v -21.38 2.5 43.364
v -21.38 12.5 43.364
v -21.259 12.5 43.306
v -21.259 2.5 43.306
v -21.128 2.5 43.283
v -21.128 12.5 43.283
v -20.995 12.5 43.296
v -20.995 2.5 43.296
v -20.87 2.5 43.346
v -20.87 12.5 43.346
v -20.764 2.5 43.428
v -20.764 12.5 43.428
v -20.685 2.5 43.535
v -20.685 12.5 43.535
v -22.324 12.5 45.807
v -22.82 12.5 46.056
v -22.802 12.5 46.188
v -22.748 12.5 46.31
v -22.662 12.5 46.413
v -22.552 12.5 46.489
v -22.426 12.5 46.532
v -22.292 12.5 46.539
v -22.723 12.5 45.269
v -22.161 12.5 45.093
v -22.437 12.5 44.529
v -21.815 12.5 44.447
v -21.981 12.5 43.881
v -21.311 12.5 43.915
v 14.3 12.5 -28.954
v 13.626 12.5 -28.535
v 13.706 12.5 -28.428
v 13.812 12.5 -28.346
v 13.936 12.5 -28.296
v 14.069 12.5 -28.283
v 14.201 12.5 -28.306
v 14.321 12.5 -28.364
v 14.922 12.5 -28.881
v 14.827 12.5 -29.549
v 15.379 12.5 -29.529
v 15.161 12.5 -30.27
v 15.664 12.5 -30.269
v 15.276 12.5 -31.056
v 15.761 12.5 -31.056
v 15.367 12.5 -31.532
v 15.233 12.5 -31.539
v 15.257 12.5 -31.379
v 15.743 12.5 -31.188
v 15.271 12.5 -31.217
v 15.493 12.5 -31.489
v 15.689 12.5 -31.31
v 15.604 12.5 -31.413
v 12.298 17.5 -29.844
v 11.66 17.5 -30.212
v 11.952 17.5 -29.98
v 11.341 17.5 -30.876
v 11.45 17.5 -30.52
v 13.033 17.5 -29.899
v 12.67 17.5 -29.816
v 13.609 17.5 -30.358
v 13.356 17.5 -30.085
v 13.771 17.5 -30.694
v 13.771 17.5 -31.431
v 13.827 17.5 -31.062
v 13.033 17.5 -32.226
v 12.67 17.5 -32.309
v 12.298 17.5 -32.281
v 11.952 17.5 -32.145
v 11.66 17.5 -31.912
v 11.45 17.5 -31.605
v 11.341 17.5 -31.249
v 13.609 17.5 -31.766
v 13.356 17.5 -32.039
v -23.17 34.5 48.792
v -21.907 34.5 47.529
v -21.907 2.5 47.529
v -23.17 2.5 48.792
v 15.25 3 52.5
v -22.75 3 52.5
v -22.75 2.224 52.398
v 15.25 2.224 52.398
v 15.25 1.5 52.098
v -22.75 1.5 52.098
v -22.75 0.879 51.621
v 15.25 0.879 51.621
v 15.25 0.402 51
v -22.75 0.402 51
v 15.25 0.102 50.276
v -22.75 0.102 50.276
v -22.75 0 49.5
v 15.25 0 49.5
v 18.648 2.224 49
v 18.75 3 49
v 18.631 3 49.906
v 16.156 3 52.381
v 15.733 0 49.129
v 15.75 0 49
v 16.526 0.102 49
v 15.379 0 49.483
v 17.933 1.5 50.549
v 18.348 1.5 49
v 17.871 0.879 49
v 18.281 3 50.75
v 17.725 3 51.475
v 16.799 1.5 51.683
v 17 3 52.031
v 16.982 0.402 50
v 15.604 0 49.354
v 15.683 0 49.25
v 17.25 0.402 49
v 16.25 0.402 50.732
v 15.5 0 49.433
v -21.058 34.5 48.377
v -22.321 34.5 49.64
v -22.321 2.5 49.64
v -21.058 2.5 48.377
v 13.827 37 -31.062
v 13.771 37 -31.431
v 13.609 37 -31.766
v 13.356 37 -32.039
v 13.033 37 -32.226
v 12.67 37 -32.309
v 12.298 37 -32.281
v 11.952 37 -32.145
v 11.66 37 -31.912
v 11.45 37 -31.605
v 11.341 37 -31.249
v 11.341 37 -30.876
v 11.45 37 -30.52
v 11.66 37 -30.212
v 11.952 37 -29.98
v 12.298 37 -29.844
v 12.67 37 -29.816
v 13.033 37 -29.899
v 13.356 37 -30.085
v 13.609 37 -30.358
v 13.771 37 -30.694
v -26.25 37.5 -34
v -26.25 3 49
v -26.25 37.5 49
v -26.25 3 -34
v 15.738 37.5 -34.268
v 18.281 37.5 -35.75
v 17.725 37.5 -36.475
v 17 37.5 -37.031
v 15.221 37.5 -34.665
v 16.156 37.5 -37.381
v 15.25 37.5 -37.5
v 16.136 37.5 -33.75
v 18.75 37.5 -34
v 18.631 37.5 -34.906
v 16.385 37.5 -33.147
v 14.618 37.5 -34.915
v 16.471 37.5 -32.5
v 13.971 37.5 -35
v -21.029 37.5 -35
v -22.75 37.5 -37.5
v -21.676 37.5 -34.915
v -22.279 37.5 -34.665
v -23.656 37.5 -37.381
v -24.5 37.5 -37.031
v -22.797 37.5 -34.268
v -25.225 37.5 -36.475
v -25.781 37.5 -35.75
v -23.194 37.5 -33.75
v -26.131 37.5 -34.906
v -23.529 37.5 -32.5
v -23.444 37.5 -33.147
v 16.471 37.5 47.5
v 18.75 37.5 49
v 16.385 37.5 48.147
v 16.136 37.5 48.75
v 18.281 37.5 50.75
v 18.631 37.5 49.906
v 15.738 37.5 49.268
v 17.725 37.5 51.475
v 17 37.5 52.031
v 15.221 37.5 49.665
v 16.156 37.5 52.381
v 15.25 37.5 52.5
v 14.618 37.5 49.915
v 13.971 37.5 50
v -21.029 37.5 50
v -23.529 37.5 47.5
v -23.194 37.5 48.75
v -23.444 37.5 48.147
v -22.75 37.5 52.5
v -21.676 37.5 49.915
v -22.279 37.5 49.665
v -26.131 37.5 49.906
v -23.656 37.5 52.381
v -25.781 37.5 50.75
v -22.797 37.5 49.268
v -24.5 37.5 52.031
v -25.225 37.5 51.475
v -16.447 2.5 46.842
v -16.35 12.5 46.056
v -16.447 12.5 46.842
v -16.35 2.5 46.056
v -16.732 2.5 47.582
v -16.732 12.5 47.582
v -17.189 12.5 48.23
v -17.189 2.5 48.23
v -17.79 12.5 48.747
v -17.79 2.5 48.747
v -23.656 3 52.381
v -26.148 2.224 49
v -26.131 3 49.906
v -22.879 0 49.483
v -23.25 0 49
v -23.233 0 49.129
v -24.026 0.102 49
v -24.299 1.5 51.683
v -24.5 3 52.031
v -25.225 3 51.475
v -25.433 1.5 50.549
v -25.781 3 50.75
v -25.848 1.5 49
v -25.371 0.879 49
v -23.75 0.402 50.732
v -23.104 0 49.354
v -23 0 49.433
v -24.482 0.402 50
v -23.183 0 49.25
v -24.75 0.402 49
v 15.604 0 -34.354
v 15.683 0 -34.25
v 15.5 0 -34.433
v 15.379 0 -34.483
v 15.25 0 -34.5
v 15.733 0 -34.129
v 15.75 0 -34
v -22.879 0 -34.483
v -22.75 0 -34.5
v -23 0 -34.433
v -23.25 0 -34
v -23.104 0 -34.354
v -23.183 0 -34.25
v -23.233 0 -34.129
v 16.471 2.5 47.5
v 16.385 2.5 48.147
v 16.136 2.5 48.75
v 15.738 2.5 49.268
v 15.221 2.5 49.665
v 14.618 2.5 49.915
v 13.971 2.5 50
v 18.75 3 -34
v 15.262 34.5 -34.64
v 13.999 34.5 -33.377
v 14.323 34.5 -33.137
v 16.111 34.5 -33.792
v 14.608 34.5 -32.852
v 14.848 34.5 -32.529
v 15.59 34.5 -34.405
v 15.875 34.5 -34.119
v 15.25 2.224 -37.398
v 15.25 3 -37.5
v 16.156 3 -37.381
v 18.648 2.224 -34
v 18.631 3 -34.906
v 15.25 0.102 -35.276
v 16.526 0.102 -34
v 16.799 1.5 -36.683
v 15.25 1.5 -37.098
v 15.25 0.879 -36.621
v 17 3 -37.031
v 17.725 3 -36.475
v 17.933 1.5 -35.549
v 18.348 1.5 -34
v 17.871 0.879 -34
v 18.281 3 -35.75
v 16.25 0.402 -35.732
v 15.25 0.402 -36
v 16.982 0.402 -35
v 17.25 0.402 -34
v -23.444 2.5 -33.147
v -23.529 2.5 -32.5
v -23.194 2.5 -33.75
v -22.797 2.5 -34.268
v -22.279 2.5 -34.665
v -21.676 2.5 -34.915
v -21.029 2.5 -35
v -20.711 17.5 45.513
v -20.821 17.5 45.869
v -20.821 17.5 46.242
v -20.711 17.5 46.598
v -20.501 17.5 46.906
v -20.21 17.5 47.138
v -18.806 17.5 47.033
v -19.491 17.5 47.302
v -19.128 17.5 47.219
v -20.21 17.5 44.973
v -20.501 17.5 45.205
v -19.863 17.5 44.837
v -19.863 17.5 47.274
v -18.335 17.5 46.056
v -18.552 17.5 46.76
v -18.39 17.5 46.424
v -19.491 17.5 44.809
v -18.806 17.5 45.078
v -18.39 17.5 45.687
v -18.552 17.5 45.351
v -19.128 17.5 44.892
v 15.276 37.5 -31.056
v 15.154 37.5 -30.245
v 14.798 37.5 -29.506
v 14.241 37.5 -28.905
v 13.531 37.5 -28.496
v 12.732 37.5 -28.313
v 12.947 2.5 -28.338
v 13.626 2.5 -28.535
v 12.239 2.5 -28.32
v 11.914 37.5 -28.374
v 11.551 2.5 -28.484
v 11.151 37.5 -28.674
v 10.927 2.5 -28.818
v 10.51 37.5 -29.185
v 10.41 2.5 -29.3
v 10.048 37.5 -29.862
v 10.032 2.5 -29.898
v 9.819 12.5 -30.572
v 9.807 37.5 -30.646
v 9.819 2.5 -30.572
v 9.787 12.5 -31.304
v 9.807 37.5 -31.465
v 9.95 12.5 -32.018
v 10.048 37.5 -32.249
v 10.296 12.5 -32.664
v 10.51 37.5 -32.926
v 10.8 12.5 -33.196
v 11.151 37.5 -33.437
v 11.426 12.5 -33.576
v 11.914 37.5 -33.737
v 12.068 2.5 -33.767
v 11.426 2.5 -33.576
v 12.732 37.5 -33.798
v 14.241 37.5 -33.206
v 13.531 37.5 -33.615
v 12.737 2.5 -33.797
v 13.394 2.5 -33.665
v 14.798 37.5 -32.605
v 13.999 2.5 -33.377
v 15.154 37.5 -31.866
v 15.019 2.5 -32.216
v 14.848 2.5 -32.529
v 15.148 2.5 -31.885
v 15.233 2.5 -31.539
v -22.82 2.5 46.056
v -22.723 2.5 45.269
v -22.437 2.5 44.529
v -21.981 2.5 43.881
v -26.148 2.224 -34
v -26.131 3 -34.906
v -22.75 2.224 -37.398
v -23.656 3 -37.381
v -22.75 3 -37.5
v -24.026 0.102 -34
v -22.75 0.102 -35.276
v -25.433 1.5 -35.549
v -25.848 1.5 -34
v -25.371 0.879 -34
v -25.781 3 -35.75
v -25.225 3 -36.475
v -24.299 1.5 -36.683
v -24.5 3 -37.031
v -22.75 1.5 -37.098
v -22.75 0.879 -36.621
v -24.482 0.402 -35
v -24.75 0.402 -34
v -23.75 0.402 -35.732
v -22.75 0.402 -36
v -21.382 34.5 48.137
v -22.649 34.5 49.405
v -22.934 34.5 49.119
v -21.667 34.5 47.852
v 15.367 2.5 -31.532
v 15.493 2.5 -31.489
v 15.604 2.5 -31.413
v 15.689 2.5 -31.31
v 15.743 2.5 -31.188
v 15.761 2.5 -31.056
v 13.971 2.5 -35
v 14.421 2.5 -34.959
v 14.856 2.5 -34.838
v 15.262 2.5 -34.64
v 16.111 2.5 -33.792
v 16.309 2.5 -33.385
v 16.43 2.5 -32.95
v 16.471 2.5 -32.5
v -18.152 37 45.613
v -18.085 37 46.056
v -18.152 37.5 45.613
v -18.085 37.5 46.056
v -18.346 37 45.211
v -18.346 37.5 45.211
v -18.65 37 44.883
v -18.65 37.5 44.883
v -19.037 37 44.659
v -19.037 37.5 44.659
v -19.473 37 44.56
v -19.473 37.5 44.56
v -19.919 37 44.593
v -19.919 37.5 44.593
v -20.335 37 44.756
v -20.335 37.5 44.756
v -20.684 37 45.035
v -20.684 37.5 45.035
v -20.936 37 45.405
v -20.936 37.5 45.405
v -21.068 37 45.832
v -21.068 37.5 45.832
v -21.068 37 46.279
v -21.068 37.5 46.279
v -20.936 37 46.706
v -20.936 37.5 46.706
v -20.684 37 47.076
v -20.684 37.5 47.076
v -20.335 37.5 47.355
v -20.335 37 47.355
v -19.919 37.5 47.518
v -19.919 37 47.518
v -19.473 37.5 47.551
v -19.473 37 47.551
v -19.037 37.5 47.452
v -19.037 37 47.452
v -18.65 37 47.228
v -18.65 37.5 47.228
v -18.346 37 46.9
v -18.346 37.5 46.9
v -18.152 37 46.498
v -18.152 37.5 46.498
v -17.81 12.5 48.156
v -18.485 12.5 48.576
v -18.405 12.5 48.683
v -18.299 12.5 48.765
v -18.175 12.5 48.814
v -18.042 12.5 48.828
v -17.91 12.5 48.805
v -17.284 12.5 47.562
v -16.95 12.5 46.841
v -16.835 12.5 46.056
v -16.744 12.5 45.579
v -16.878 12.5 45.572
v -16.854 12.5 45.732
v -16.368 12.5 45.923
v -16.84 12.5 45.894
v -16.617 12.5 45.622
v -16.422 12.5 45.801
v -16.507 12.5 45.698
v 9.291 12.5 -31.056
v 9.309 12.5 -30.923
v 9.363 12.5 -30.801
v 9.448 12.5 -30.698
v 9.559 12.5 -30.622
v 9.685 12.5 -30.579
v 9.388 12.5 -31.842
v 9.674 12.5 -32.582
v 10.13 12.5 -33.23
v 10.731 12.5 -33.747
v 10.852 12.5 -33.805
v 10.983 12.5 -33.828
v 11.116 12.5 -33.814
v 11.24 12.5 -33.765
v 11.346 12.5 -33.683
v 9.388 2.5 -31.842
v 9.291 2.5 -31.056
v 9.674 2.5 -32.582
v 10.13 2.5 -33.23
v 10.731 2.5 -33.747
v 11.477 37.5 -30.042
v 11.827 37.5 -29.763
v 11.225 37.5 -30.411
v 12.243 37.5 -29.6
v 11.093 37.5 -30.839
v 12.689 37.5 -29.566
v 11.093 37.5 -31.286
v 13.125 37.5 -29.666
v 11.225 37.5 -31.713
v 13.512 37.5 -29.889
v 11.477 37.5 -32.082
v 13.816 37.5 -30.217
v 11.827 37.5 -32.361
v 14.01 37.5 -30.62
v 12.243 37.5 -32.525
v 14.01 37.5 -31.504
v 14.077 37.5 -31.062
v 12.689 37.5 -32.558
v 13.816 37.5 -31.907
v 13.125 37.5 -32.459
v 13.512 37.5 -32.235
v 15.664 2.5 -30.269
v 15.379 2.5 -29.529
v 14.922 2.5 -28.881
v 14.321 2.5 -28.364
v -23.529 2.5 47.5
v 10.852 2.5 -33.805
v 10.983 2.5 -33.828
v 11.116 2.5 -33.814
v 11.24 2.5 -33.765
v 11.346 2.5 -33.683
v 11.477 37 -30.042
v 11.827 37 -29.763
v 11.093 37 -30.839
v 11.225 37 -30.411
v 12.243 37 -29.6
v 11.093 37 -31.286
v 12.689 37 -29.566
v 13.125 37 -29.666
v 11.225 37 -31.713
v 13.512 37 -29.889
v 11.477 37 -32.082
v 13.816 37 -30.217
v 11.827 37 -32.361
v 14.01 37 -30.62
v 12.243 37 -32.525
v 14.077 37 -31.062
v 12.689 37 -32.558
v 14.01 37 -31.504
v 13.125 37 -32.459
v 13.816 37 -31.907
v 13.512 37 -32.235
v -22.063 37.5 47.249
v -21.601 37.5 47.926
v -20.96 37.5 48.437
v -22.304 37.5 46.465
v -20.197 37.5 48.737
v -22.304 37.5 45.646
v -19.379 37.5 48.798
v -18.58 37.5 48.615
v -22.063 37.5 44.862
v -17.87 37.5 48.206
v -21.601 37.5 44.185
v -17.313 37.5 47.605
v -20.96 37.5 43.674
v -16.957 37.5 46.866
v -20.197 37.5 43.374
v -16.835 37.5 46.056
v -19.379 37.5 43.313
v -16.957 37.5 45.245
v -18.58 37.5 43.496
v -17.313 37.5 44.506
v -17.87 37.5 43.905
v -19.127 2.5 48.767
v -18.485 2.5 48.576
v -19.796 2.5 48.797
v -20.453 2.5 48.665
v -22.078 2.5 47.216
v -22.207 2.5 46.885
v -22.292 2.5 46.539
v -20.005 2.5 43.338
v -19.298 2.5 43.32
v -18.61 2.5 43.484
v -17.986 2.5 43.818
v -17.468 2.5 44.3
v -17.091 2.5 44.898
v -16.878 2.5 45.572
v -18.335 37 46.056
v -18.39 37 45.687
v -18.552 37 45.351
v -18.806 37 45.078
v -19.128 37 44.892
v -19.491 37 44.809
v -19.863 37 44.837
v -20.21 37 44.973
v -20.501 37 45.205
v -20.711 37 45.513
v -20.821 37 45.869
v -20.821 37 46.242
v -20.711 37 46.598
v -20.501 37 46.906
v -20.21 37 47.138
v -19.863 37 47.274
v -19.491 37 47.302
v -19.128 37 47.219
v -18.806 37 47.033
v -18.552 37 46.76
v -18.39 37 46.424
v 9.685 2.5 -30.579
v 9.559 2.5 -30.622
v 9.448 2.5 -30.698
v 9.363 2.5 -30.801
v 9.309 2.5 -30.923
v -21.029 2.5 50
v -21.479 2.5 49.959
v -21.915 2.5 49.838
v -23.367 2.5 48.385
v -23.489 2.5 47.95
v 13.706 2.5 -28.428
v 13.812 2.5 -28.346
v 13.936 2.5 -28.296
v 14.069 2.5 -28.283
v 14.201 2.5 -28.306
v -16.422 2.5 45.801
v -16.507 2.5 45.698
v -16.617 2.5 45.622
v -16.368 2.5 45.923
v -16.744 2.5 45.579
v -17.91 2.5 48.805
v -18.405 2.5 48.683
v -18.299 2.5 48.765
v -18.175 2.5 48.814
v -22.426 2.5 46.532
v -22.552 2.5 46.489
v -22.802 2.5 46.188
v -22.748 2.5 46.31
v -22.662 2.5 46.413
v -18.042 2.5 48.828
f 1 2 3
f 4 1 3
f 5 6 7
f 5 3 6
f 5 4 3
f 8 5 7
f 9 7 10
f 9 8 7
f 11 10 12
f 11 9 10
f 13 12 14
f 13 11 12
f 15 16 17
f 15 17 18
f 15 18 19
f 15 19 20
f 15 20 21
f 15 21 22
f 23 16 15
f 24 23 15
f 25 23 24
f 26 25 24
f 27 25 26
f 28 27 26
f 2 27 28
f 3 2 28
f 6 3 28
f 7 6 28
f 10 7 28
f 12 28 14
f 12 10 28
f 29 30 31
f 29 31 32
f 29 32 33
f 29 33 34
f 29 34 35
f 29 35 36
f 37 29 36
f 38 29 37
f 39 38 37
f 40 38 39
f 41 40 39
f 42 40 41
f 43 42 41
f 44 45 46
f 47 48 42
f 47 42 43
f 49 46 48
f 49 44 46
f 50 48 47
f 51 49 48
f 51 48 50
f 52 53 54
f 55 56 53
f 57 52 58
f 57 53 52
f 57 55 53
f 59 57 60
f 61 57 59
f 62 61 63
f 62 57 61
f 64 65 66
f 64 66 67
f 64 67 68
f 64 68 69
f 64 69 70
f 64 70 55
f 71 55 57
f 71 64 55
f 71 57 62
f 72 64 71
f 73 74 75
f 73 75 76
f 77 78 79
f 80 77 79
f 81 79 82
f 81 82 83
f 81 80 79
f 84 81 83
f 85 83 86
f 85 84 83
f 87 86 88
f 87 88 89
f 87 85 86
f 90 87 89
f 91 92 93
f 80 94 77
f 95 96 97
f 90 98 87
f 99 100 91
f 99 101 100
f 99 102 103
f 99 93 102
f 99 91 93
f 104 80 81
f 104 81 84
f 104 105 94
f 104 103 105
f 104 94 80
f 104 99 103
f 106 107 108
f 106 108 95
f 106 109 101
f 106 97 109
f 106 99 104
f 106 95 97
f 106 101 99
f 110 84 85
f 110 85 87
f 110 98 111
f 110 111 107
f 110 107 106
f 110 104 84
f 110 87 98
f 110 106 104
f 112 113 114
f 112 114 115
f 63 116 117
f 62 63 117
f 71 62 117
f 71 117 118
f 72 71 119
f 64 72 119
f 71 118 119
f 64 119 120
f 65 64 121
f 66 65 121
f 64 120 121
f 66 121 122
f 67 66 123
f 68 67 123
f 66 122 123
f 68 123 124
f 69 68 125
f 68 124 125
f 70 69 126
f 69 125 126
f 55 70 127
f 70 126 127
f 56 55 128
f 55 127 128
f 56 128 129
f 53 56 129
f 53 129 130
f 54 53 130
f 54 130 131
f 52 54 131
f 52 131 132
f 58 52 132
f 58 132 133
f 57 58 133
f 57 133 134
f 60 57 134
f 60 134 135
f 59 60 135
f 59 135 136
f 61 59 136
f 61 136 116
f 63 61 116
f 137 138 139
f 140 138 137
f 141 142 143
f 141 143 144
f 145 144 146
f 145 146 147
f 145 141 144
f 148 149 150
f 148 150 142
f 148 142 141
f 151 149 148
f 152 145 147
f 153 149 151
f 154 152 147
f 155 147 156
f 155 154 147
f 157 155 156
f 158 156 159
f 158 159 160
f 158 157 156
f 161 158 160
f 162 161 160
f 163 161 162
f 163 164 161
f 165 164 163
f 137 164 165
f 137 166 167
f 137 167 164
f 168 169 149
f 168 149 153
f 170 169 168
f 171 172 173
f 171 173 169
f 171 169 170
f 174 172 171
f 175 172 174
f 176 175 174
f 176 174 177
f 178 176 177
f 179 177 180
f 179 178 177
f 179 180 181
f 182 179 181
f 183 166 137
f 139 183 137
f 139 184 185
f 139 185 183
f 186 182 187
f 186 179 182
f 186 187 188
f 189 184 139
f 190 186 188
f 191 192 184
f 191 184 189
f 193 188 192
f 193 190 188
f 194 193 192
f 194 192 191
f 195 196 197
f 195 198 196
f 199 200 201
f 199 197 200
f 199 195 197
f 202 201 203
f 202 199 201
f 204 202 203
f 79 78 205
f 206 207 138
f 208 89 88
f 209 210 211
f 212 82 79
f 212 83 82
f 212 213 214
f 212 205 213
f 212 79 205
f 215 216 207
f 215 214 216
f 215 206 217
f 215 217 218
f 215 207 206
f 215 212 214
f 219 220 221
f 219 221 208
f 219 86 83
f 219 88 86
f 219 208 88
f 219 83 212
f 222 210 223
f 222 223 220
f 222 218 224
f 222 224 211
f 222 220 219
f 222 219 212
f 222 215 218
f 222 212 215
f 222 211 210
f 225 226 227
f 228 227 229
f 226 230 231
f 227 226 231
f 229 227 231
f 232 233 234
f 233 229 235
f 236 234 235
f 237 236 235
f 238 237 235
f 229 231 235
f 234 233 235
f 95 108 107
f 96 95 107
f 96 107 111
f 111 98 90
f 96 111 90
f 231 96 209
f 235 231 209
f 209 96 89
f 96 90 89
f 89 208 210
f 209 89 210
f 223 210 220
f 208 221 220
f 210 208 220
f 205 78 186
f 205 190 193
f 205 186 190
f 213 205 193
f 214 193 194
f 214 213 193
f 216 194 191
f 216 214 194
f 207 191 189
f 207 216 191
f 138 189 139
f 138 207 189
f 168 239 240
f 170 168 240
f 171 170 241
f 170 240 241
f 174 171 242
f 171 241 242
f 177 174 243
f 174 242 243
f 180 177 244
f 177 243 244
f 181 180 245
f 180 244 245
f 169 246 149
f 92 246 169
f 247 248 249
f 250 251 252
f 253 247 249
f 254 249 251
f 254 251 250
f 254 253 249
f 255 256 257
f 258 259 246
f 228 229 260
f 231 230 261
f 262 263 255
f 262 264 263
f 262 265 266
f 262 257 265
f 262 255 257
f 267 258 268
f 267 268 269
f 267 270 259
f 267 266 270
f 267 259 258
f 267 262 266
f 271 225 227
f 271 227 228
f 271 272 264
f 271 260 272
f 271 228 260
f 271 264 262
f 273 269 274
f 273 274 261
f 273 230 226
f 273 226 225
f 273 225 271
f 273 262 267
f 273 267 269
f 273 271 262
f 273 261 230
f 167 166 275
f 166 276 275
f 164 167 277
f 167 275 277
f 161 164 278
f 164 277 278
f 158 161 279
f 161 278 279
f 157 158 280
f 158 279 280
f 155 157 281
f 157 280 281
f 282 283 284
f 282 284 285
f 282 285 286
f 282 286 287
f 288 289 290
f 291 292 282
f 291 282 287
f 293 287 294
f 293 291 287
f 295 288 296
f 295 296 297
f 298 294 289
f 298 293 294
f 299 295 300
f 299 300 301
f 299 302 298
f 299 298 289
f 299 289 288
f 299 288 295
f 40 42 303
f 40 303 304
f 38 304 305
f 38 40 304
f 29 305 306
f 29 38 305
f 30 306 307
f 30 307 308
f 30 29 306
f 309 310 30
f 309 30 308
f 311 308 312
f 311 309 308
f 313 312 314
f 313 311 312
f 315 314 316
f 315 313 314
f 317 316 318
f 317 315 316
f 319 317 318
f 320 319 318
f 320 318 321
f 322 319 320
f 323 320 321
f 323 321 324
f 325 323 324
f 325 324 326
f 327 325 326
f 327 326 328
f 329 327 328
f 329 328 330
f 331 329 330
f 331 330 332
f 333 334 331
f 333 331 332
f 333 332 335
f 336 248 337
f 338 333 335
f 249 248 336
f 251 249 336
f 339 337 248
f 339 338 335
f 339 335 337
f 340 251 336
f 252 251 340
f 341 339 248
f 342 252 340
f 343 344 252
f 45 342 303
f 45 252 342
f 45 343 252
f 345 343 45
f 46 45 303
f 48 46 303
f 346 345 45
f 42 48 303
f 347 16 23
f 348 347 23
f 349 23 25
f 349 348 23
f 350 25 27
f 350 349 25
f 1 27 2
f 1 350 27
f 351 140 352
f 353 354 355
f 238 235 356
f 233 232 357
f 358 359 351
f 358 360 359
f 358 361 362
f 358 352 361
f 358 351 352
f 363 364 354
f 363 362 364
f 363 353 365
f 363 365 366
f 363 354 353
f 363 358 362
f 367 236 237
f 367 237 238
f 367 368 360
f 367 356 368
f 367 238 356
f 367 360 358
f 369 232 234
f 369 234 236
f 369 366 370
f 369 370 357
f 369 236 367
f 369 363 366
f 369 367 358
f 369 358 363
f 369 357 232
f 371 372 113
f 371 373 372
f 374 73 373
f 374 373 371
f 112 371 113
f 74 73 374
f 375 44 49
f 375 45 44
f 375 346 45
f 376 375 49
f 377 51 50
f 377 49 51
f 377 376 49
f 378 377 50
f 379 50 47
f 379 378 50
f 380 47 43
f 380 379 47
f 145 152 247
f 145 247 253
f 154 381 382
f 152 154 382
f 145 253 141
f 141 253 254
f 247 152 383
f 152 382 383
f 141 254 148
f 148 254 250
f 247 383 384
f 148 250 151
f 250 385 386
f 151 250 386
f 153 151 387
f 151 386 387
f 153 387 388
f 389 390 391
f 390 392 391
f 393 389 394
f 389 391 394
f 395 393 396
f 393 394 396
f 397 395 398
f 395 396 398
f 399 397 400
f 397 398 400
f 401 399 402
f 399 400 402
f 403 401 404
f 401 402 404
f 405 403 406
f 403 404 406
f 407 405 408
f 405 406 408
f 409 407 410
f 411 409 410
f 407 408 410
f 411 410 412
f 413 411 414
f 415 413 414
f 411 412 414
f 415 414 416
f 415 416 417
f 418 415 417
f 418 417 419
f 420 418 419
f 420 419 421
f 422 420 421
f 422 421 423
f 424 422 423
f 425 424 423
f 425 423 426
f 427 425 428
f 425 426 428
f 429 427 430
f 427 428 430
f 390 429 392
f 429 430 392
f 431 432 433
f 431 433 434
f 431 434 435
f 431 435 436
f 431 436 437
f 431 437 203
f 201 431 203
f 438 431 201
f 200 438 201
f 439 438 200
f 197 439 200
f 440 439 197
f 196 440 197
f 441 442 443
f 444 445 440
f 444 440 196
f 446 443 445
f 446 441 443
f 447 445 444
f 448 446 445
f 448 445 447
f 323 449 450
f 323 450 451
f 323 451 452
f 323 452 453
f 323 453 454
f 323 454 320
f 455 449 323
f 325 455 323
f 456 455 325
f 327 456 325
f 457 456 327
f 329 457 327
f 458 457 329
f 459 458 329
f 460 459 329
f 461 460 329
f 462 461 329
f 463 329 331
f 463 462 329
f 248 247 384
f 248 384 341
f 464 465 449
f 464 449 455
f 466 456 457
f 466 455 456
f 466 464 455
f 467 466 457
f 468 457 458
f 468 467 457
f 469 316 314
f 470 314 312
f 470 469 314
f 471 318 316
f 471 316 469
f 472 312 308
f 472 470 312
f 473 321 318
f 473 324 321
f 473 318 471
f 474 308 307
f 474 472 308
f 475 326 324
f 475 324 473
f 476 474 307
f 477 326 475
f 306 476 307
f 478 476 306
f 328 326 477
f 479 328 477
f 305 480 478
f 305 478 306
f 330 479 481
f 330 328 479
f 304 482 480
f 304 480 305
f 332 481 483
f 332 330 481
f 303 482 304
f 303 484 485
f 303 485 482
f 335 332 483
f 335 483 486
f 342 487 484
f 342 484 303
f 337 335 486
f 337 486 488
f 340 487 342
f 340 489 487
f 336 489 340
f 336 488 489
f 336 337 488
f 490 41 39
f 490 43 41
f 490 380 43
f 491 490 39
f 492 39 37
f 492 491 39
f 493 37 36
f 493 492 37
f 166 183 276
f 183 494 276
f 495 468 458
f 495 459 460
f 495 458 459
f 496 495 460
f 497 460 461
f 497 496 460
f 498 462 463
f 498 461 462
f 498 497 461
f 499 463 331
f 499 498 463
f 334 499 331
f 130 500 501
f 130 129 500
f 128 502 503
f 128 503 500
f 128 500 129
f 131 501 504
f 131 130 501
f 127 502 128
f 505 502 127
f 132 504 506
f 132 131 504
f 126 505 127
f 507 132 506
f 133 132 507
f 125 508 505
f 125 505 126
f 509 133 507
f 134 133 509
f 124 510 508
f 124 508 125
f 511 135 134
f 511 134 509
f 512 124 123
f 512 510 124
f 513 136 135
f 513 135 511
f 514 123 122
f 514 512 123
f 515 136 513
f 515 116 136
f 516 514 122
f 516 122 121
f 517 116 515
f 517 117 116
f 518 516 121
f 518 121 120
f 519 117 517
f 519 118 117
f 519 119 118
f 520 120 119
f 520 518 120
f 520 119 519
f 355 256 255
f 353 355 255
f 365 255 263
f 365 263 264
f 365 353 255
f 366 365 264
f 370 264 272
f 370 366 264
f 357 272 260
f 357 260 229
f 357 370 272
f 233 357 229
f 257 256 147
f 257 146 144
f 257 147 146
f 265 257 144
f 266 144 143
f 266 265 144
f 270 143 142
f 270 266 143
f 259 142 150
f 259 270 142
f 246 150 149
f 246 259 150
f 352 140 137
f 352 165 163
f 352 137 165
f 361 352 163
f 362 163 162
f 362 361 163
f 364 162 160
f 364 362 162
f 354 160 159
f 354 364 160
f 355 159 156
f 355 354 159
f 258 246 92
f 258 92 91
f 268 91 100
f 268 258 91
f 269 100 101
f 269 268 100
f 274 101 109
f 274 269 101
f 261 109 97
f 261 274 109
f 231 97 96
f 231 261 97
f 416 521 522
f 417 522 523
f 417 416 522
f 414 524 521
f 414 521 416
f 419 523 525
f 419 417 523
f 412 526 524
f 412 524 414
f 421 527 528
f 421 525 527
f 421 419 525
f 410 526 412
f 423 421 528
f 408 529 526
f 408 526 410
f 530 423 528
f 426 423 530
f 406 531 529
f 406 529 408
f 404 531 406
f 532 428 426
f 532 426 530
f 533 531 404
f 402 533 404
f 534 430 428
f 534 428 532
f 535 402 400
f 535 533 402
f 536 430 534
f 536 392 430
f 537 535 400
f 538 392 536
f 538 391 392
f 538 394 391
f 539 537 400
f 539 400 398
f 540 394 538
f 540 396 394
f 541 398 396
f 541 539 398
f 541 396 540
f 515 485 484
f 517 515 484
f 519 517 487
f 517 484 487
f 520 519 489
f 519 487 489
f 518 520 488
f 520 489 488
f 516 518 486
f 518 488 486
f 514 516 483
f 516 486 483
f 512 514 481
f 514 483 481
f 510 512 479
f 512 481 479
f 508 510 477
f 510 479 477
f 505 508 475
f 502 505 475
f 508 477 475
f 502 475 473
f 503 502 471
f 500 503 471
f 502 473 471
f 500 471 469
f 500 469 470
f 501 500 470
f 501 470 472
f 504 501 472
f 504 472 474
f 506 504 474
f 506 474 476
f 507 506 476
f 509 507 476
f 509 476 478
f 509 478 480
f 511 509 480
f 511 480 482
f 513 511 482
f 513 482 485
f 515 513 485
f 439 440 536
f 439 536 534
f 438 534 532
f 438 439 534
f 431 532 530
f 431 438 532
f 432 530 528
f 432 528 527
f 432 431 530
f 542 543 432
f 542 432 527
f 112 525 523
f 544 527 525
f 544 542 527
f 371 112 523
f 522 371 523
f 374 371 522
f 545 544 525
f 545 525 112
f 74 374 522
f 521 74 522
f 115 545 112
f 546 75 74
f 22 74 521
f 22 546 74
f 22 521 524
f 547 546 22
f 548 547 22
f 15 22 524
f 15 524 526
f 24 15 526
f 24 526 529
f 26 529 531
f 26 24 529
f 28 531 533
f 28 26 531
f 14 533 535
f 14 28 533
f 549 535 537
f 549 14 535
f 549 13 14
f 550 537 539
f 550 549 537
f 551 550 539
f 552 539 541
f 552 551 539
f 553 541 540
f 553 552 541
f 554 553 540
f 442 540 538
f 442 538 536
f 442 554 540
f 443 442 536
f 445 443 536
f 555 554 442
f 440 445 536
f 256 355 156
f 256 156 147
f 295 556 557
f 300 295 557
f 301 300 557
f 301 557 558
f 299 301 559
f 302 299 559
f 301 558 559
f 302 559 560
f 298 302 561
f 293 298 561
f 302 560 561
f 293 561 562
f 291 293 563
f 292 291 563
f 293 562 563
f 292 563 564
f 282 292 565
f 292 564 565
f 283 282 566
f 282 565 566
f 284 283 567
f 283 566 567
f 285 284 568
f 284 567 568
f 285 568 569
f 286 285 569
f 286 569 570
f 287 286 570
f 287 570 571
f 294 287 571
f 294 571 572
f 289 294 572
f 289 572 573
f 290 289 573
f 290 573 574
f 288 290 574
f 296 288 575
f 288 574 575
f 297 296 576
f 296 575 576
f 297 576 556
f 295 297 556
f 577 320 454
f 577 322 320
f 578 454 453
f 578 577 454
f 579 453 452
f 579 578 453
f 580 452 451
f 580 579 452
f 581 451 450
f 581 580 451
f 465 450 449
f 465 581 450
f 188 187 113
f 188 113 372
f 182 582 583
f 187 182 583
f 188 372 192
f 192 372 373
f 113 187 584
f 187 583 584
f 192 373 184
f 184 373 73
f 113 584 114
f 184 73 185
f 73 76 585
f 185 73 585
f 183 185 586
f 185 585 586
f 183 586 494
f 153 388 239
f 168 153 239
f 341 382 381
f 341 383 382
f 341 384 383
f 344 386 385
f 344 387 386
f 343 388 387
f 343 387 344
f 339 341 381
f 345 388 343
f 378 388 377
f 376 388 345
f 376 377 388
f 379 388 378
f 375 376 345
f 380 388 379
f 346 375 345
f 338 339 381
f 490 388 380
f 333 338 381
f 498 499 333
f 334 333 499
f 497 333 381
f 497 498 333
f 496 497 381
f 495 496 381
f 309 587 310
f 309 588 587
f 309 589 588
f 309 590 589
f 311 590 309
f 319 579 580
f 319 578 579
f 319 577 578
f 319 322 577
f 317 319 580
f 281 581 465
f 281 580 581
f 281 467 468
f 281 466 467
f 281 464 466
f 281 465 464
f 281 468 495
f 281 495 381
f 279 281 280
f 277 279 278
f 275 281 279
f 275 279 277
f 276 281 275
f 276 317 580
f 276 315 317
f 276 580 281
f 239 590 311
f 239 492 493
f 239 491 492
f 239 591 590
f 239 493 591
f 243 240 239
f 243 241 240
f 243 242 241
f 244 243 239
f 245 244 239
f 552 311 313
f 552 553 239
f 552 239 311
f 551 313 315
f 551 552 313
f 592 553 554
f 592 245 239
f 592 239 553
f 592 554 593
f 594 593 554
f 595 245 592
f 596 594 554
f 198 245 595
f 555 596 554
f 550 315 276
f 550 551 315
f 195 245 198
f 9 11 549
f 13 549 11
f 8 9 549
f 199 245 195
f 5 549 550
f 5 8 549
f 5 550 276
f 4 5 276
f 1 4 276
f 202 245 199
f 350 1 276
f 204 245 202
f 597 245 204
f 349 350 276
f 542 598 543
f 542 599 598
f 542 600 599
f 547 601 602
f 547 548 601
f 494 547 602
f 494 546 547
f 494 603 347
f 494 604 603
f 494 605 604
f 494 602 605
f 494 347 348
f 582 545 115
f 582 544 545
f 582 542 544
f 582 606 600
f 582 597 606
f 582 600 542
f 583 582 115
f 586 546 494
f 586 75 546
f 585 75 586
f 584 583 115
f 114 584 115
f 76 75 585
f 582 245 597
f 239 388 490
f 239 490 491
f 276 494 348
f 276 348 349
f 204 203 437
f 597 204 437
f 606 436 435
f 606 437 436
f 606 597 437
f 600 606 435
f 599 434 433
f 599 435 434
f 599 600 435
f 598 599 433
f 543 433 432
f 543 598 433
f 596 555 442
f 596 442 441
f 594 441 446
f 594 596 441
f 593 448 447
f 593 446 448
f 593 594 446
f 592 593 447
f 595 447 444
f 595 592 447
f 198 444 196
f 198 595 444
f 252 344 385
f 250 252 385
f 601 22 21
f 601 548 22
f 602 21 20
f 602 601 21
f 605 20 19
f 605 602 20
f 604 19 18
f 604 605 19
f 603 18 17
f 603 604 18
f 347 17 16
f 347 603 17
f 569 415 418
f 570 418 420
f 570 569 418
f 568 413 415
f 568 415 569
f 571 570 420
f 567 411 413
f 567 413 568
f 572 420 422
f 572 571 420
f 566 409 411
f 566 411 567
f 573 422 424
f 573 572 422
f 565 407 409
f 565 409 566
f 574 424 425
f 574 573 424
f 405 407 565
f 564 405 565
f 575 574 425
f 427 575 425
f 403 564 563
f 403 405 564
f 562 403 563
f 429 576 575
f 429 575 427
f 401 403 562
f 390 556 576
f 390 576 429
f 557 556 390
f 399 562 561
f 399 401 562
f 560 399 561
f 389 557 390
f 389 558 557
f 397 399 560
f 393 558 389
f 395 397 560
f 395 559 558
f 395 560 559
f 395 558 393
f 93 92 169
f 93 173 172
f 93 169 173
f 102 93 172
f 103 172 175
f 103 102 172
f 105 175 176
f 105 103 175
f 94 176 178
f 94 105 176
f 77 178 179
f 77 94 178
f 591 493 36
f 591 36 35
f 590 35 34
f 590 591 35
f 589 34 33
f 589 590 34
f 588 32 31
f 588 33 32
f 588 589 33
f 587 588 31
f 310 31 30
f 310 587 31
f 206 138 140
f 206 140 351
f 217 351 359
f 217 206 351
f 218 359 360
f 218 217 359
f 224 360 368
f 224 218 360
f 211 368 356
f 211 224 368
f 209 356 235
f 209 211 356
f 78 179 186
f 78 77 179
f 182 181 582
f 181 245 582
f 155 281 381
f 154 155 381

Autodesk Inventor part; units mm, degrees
ref_plane "YZ Plane" through (0, 0, 0) normal (1, 0, 0) x (0, 1, 0)
ref_plane "XZ Plane" through (0, 0, 0) normal (0, 1, 0) x (-1, 0, 0)
ref_plane "XY Plane" through (0, 0, 0) normal (0, 0, 1) x (1, 0, 0)
sketch "Sketch1" plane through (0, 0, 0) normal (0, 1, 0) x (-1, 0, 0)
  line L0 (-18.75, 52.5) -> (26.25, 52.5)
  line L1 (26.25, 52.5) -> (26.25, -37.5)
  line L2 (26.25, -37.5) -> (-18.75, -37.5)
  line L3 (-18.75, -37.5) -> (-18.75, 52.5)
  line L4 (26.25, 52.5) -> (-18.75, -37.5) construction
  line L5 (-16.4706, 50) -> (23.5294, 50)
  line L6 (23.5294, 50) -> (23.5294, -35)
  line L7 (23.5294, -35) -> (-16.4706, -35)
  line L8 (-16.4706, -35) -> (-16.4706, 50)
  line L9 (23.5294, 50) -> (-16.4706, -35) construction
  line L10 (23.5294, 50) -> (21.0294, 50)
  line L11 (21.0294, 50) -> (21.0294, 47.5)
  line L12 (21.0294, 47.5) -> (23.5294, 47.5)
  line L13 (23.5294, 47.5) -> (23.5294, 50)
  arc A0 (23.5294, 47.5) -> (21.0294, 50) centre (21.0294, 47.5) ccw
  line L14 (26.25, 52.5) -> (22.75, 52.5)
  line L15 (22.75, 52.5) -> (22.75, 49)
  line L16 (22.75, 49) -> (26.25, 49)
  line L17 (26.25, 49) -> (26.25, 52.5)
  line L18 (23.5294, -35) -> (21.0294, -35)
  line L19 (21.0294, -35) -> (21.0294, -32.5)
  line L20 (21.0294, -32.5) -> (23.5294, -32.5)
  line L21 (23.5294, -32.5) -> (23.5294, -35)
  line L22 (-16.4706, -35) -> (-13.9706, -35)
  line L23 (-13.9706, -35) -> (-13.9706, -32.5)
  line L24 (-13.9706, -32.5) -> (-16.4706, -32.5)
  line L25 (-16.4706, -32.5) -> (-16.4706, -35)
  line L26 (-16.4706, 50) -> (-13.9706, 50)
  line L27 (-13.9706, 50) -> (-13.9706, 47.5)
  line L28 (-13.9706, 47.5) -> (-16.4706, 47.5)
  line L29 (-16.4706, 47.5) -> (-16.4706, 50)
  arc A1 (-13.9706, 50) -> (-16.4706, 47.5) centre (-13.9706, 47.5) ccw
  arc A2 (-16.4706, -32.5) -> (-13.9706, -35) centre (-13.9706, -32.5) ccw
  arc A3 (21.0294, -35) -> (23.5294, -32.5) centre (21.0294, -32.5) ccw
  arc A4 (26.25, 49) -> (22.75, 52.5) centre (22.75, 49) ccw
  line L30 (26.25, -37.5) -> (22.75, -37.5)
  line L31 (22.75, -37.5) -> (22.75, -34)
  line L32 (22.75, -34) -> (26.25, -34)
  line L33 (26.25, -34) -> (26.25, -37.5)
  line L34 (-18.75, -37.5) -> (-15.25, -37.5)
  line L35 (-15.25, -37.5) -> (-15.25, -34)
  line L36 (-15.25, -34) -> (-18.75, -34)
  line L37 (-18.75, -34) -> (-18.75, -37.5)
  line L38 (-18.75, 52.5) -> (-15.25, 52.5)
  line L39 (-15.25, 52.5) -> (-15.25, 49)
  line L40 (-15.25, 49) -> (-18.75, 49)
  line L41 (-18.75, 49) -> (-18.75, 52.5)
  arc A5 (-15.25, 52.5) -> (-18.75, 49) centre (-15.25, 49) ccw
  arc A6 (-18.75, -34) -> (-15.25, -37.5) centre (-15.25, -34) ccw
  arc A7 (22.75, -37.5) -> (26.25, -34) centre (22.75, -34) ccw
  point P0 (0, 0)
  point P1 (26.25, 49)
  point P2 (22.75, 52.5)
  point P3 (-18.75, -34)
  point P4 (-16.4706, -32.5)
  point P5 (-15.9706, -34)
  point P6 (-16.4706, -34)
  point P7 (23.5294, -32.5)
  dimension "d0" = 45
  dimension "d1" = 90
  dimension "d2" = 40
  dimension "d3" = 85
  dimension "d8" = 2.5
  dimension "d9" = 2.5
extrude "Extrusion3" add sketch "Sketch1" along normal blind 2.5 contours L0 L15 L5 L39 | L39 L5 L8 L40 A5 | L40 L8 L36 L3 | A4 L16 L6 L5 L15 | L39 A1 L40 L8 L5 | L5 A1 L39 | L36 L8 L7 L35 A6 | L40 A1 L8 | L15 A0 L5 | L5 L6 L16 A0 L15 | L1 L32 L6 L16 | L5 L11 L12 L6 L20 L19 L7 L23 L24 L8 L28 L27 | L27 L28 A1 L40 L39 | L39 L40 A1 | L36 A2 L35 L7 L8 | L35 L7 L31 L2 | A0 L15 L16 L12 L11 | A0 L16 L15 | A7 L31 L7 L6 L32 | L6 A0 L16 | L24 L23 A2 L35 L36 | L36 L35 A2 | L35 A2 L7 | L32 A3 L6 | L6 L7 L31 A3 L32 | L7 A3 L31 | A3 L32 L31 L19 L20 | A3 L31 L32
extrude "Extrusion4" add sketch "Sketch1" along normal blind 37.5 contours L0 L15 L5 L39 | L39 L5 L8 L40 A5 | L40 L8 L36 L3 | A4 L16 L6 L5 L15 | L39 A1 L40 L8 L5 | L5 A1 L39 | L36 L8 L7 L35 A6 | L40 A1 L8 | L15 A0 L5 | L5 L6 L16 A0 L15 | L1 L32 L6 L16 | L36 A2 L35 L7 L8 | L8 A2 L36 | L35 L7 L31 L2 | A7 L31 L7 L6 L32 | L6 A0 L16 | L35 A2 L7 | L32 A3 L6 | L6 L7 L31 A3 L32 | L7 A3 L31
fillet "Fillet1" radius 3 8 edges at (-25.2249, 0, 51.4749) (-3.75, 0, 52.5) (17.7249, 0, 51.4749) (18.75, 0, 7.5) (17.7249, 0, -36.4749) (-3.75, 0, -37.5) (-25.2249, 0, -36.4749) (-26.25, 0, 7.5)
sketch "Sketch2" plane through (0, 2.5, 0) normal (0, 1, 0) x (1, 0, 0)
  arc A0 (16.4706, 32.5) -> (13.9706, 35) centre (13.9706, 32.5) ccw projected
  line L0 (13.9706, 35) -> (13.9706, 33.5)
  line L1 (16.4706, -47.5) -> (16.4706, 32.5) projected
  line L2 (16.4706, 32.5) -> (14.9706, 32.5)
  line L3 (14.9706, 32.5) -> (13.9706, 33.5)
  line L4 (14.4706, 33) -> (12.526, 31.0555)
  circle A1 centre (12.526, 31.0555) radius 2.75
  line L5 (-23.5294, 32.5) -> (-23.5294, -47.5) projected
  line L6 (-23.5294, -47.5) -> (-22.0294, -47.5)
  line L7 (-21.0294, -50) -> (13.9706, -50) projected
  line L8 (-21.0294, -50) -> (-21.0294, -48.5)
  line L9 (-21.0294, -48.5) -> (-22.0294, -47.5)
  line L10 (-21.5294, -48) -> (-19.5849, -46.0555)
  line L11 (-21.5294, -48) -> (-18.7794, -48) construction
  circle A2 centre (-19.5849, -46.0555) radius 2.75
  arc A3 (14.0518, 28.7675) -> (15.276, 31.0555) centre (12.526, 31.0555) ccw construction
  arc A4 (14.321, 28.3639) -> (15.7612, 31.0555) centre (12.526, 31.0555) ccw
  arc A5 (13.7826, 29.1712) -> (14.7909, 31.0555) centre (12.526, 31.0555) ccw
  arc A6 (13.7826, 29.1712) -> (14.321, 28.3639) centre (14.0518, 28.7675) ccw
  arc A7 (15.7612, 31.0555) -> (14.7909, 31.0555) centre (15.276, 31.0555) ccw
  arc A8 (10.7311, 33.747) -> (9.2909, 31.0555) centre (12.526, 31.0555) ccw
  arc A9 (9.2909, 31.0555) -> (10.2612, 31.0555) centre (9.776, 31.0555) ccw
  arc A10 (11.2694, 32.9398) -> (10.7311, 33.747) centre (11.0003, 33.3434) ccw
  arc A11 (11.2694, 32.9398) -> (10.2612, 31.0555) centre (12.526, 31.0555) ccw
  arc A12 (-17.79, -48.747) -> (-16.3497, -46.0555) centre (-19.5849, -46.0555) ccw
  arc A13 (-18.3283, -47.9398) -> (-17.32, -46.0555) centre (-19.5849, -46.0555) ccw
  arc A14 (-18.3283, -47.9398) -> (-17.79, -48.747) centre (-18.0591, -48.3434) ccw
  arc A15 (-16.3497, -46.0555) -> (-17.32, -46.0555) centre (-16.8349, -46.0555) ccw
  arc A16 (-21.3798, -43.3639) -> (-22.82, -46.0555) centre (-19.5849, -46.0555) ccw
  arc A17 (-22.82, -46.0555) -> (-21.8497, -46.0555) centre (-22.3349, -46.0555) ccw
  arc A18 (-20.8415, -44.1712) -> (-21.3798, -43.3639) centre (-21.1106, -43.7675) ccw
  arc A19 (-20.8415, -44.1712) -> (-21.8497, -46.0555) centre (-19.5849, -46.0555) ccw
  line L12 (-22.8137, -49.2843) -> (-20.2452, -46.7157) construction
  line L13 (-22.3894, -49.7085) -> (-19.8209, -47.14)
  line L14 (-20.6694, -46.2915) -> (-23.2379, -48.86)
  arc A20 (-23.2379, -48.86) -> (-22.3894, -49.7085) centre (-22.8137, -49.2843) ccw
  arc A21 (-19.8209, -47.14) -> (-20.6694, -46.2915) centre (-20.2452, -46.7157) ccw
  line L15 (12.9911, 31.5205) -> (15.9501, 34.4795) construction
  line L16 (13.4153, 31.0962) -> (16.3744, 34.0552)
  line L17 (15.5258, 34.9038) -> (12.5668, 31.9448)
  arc A22 (12.5668, 31.9448) -> (13.4153, 31.0962) centre (12.9911, 31.5205) ccw
  arc A23 (16.3744, 34.0552) -> (15.5258, 34.9038) centre (15.9501, 34.4795) ccw
  point P0 (0, 0)
  point P1 (14.848, 32.5289)
  point P2 (13.9995, 33.3774)
  point P3 (11.4261, 33.5759)
  point P4 (9.8188, 30.5722)
  point P5 (13.626, 28.535)
  point P6 (15.2333, 31.5387)
  point P7 (-21.9068, -47.5289)
  point P8 (-21.0583, -48.3774)
  point P9 (-18.4849, -48.5759)
  point P10 (-16.8777, -45.5722)
  point P11 (-20.6848, -43.535)
  point P12 (-22.2921, -46.5387)
  point P13 (15.2624, 34.6404)
  point P14 (16.111, 33.7918)
  dimension "d32" = 5.5
  dimension "d29" = 1.5
  dimension "d30" = 1.5
  dimension "d31" = 2.75
  dimension "d33" = 1.5
  dimension "d34" = 1.5
  dimension "d35" = 2.75
  dimension "d36" = 45
  dimension "d37" = 5.5
  dimension "d40" = 360
  dimension "d44" = 1.2
  dimension "d45" = 1.2
extrude "Extrusion5" add sketch "Sketch2" along normal blind 35 contours A0 L17 A23 L16 | A1 L16 A22 L4 | L4 A22 L17 A1 | A1 A7 A5 A6 A9 A11 A10 L17 A22 L16 | A1 A6 A5 A7 | A10 A11 A9 A1 | A2 L14 A21 L10 | L10 A21 L13 A2 | L13 A21 L14 A2 A17 A19 A18 A15 A13 A14 | A14 A13 A15 A2 | A2 A18 A19 A17
extrude "Extrusion6" add sketch "Sketch2" along normal blind 10 contours A7 A4 A6 A1 | A1 A9 A8 A10 | A2 L14 A21 L10 | L10 A21 L13 A2 | L13 A21 L14 A2 A17 A19 A18 A15 A13 A14 | A14 A13 A15 A2 | A2 A15 A12 A14 | A17 A16 A18 A2 | A2 A18 A19 A17
sketch "Sketch3" plane through (0, 37.5, 0) normal (0, 1, 0) x (1, 0, 0)
  arc A0 (-16.8349, -46.0555) -> (-16.8349, -46.0555) centre (-19.5849, -46.0555) ccw projected
  circle A1 centre (-19.5849, -46.0555) radius 1.5
  circle A2 centre (-19.5849, -46.0555) radius 1.25
  circle A3 centre (12.5766, 31.0622) radius 1.5
  circle A4 centre (12.5766, 31.0622) radius 1.25
  point P0 (0, 0)
  dimension "d50" = 3
  dimension "d51" = 2.5
  dimension "d52" = 3
  dimension "d53" = 2.5
extrude "Extrusion7" cut sketch "Sketch3" against normal blind 0.5 contours A1 | A3
extrude "Extrusion8" cut sketch "Sketch3" against normal blind 20 contours A2 | A4
extrude "Extrusion9" add sketch "Sketch2" along normal blind 32 contours L16 L3 L17 A0 | L16 A1 L3 | L3 A1 L17 | L13 A20 L14 L9 | L9 A2 L13 | L9 L14 A2
properties part number "proper shit spodnji"
